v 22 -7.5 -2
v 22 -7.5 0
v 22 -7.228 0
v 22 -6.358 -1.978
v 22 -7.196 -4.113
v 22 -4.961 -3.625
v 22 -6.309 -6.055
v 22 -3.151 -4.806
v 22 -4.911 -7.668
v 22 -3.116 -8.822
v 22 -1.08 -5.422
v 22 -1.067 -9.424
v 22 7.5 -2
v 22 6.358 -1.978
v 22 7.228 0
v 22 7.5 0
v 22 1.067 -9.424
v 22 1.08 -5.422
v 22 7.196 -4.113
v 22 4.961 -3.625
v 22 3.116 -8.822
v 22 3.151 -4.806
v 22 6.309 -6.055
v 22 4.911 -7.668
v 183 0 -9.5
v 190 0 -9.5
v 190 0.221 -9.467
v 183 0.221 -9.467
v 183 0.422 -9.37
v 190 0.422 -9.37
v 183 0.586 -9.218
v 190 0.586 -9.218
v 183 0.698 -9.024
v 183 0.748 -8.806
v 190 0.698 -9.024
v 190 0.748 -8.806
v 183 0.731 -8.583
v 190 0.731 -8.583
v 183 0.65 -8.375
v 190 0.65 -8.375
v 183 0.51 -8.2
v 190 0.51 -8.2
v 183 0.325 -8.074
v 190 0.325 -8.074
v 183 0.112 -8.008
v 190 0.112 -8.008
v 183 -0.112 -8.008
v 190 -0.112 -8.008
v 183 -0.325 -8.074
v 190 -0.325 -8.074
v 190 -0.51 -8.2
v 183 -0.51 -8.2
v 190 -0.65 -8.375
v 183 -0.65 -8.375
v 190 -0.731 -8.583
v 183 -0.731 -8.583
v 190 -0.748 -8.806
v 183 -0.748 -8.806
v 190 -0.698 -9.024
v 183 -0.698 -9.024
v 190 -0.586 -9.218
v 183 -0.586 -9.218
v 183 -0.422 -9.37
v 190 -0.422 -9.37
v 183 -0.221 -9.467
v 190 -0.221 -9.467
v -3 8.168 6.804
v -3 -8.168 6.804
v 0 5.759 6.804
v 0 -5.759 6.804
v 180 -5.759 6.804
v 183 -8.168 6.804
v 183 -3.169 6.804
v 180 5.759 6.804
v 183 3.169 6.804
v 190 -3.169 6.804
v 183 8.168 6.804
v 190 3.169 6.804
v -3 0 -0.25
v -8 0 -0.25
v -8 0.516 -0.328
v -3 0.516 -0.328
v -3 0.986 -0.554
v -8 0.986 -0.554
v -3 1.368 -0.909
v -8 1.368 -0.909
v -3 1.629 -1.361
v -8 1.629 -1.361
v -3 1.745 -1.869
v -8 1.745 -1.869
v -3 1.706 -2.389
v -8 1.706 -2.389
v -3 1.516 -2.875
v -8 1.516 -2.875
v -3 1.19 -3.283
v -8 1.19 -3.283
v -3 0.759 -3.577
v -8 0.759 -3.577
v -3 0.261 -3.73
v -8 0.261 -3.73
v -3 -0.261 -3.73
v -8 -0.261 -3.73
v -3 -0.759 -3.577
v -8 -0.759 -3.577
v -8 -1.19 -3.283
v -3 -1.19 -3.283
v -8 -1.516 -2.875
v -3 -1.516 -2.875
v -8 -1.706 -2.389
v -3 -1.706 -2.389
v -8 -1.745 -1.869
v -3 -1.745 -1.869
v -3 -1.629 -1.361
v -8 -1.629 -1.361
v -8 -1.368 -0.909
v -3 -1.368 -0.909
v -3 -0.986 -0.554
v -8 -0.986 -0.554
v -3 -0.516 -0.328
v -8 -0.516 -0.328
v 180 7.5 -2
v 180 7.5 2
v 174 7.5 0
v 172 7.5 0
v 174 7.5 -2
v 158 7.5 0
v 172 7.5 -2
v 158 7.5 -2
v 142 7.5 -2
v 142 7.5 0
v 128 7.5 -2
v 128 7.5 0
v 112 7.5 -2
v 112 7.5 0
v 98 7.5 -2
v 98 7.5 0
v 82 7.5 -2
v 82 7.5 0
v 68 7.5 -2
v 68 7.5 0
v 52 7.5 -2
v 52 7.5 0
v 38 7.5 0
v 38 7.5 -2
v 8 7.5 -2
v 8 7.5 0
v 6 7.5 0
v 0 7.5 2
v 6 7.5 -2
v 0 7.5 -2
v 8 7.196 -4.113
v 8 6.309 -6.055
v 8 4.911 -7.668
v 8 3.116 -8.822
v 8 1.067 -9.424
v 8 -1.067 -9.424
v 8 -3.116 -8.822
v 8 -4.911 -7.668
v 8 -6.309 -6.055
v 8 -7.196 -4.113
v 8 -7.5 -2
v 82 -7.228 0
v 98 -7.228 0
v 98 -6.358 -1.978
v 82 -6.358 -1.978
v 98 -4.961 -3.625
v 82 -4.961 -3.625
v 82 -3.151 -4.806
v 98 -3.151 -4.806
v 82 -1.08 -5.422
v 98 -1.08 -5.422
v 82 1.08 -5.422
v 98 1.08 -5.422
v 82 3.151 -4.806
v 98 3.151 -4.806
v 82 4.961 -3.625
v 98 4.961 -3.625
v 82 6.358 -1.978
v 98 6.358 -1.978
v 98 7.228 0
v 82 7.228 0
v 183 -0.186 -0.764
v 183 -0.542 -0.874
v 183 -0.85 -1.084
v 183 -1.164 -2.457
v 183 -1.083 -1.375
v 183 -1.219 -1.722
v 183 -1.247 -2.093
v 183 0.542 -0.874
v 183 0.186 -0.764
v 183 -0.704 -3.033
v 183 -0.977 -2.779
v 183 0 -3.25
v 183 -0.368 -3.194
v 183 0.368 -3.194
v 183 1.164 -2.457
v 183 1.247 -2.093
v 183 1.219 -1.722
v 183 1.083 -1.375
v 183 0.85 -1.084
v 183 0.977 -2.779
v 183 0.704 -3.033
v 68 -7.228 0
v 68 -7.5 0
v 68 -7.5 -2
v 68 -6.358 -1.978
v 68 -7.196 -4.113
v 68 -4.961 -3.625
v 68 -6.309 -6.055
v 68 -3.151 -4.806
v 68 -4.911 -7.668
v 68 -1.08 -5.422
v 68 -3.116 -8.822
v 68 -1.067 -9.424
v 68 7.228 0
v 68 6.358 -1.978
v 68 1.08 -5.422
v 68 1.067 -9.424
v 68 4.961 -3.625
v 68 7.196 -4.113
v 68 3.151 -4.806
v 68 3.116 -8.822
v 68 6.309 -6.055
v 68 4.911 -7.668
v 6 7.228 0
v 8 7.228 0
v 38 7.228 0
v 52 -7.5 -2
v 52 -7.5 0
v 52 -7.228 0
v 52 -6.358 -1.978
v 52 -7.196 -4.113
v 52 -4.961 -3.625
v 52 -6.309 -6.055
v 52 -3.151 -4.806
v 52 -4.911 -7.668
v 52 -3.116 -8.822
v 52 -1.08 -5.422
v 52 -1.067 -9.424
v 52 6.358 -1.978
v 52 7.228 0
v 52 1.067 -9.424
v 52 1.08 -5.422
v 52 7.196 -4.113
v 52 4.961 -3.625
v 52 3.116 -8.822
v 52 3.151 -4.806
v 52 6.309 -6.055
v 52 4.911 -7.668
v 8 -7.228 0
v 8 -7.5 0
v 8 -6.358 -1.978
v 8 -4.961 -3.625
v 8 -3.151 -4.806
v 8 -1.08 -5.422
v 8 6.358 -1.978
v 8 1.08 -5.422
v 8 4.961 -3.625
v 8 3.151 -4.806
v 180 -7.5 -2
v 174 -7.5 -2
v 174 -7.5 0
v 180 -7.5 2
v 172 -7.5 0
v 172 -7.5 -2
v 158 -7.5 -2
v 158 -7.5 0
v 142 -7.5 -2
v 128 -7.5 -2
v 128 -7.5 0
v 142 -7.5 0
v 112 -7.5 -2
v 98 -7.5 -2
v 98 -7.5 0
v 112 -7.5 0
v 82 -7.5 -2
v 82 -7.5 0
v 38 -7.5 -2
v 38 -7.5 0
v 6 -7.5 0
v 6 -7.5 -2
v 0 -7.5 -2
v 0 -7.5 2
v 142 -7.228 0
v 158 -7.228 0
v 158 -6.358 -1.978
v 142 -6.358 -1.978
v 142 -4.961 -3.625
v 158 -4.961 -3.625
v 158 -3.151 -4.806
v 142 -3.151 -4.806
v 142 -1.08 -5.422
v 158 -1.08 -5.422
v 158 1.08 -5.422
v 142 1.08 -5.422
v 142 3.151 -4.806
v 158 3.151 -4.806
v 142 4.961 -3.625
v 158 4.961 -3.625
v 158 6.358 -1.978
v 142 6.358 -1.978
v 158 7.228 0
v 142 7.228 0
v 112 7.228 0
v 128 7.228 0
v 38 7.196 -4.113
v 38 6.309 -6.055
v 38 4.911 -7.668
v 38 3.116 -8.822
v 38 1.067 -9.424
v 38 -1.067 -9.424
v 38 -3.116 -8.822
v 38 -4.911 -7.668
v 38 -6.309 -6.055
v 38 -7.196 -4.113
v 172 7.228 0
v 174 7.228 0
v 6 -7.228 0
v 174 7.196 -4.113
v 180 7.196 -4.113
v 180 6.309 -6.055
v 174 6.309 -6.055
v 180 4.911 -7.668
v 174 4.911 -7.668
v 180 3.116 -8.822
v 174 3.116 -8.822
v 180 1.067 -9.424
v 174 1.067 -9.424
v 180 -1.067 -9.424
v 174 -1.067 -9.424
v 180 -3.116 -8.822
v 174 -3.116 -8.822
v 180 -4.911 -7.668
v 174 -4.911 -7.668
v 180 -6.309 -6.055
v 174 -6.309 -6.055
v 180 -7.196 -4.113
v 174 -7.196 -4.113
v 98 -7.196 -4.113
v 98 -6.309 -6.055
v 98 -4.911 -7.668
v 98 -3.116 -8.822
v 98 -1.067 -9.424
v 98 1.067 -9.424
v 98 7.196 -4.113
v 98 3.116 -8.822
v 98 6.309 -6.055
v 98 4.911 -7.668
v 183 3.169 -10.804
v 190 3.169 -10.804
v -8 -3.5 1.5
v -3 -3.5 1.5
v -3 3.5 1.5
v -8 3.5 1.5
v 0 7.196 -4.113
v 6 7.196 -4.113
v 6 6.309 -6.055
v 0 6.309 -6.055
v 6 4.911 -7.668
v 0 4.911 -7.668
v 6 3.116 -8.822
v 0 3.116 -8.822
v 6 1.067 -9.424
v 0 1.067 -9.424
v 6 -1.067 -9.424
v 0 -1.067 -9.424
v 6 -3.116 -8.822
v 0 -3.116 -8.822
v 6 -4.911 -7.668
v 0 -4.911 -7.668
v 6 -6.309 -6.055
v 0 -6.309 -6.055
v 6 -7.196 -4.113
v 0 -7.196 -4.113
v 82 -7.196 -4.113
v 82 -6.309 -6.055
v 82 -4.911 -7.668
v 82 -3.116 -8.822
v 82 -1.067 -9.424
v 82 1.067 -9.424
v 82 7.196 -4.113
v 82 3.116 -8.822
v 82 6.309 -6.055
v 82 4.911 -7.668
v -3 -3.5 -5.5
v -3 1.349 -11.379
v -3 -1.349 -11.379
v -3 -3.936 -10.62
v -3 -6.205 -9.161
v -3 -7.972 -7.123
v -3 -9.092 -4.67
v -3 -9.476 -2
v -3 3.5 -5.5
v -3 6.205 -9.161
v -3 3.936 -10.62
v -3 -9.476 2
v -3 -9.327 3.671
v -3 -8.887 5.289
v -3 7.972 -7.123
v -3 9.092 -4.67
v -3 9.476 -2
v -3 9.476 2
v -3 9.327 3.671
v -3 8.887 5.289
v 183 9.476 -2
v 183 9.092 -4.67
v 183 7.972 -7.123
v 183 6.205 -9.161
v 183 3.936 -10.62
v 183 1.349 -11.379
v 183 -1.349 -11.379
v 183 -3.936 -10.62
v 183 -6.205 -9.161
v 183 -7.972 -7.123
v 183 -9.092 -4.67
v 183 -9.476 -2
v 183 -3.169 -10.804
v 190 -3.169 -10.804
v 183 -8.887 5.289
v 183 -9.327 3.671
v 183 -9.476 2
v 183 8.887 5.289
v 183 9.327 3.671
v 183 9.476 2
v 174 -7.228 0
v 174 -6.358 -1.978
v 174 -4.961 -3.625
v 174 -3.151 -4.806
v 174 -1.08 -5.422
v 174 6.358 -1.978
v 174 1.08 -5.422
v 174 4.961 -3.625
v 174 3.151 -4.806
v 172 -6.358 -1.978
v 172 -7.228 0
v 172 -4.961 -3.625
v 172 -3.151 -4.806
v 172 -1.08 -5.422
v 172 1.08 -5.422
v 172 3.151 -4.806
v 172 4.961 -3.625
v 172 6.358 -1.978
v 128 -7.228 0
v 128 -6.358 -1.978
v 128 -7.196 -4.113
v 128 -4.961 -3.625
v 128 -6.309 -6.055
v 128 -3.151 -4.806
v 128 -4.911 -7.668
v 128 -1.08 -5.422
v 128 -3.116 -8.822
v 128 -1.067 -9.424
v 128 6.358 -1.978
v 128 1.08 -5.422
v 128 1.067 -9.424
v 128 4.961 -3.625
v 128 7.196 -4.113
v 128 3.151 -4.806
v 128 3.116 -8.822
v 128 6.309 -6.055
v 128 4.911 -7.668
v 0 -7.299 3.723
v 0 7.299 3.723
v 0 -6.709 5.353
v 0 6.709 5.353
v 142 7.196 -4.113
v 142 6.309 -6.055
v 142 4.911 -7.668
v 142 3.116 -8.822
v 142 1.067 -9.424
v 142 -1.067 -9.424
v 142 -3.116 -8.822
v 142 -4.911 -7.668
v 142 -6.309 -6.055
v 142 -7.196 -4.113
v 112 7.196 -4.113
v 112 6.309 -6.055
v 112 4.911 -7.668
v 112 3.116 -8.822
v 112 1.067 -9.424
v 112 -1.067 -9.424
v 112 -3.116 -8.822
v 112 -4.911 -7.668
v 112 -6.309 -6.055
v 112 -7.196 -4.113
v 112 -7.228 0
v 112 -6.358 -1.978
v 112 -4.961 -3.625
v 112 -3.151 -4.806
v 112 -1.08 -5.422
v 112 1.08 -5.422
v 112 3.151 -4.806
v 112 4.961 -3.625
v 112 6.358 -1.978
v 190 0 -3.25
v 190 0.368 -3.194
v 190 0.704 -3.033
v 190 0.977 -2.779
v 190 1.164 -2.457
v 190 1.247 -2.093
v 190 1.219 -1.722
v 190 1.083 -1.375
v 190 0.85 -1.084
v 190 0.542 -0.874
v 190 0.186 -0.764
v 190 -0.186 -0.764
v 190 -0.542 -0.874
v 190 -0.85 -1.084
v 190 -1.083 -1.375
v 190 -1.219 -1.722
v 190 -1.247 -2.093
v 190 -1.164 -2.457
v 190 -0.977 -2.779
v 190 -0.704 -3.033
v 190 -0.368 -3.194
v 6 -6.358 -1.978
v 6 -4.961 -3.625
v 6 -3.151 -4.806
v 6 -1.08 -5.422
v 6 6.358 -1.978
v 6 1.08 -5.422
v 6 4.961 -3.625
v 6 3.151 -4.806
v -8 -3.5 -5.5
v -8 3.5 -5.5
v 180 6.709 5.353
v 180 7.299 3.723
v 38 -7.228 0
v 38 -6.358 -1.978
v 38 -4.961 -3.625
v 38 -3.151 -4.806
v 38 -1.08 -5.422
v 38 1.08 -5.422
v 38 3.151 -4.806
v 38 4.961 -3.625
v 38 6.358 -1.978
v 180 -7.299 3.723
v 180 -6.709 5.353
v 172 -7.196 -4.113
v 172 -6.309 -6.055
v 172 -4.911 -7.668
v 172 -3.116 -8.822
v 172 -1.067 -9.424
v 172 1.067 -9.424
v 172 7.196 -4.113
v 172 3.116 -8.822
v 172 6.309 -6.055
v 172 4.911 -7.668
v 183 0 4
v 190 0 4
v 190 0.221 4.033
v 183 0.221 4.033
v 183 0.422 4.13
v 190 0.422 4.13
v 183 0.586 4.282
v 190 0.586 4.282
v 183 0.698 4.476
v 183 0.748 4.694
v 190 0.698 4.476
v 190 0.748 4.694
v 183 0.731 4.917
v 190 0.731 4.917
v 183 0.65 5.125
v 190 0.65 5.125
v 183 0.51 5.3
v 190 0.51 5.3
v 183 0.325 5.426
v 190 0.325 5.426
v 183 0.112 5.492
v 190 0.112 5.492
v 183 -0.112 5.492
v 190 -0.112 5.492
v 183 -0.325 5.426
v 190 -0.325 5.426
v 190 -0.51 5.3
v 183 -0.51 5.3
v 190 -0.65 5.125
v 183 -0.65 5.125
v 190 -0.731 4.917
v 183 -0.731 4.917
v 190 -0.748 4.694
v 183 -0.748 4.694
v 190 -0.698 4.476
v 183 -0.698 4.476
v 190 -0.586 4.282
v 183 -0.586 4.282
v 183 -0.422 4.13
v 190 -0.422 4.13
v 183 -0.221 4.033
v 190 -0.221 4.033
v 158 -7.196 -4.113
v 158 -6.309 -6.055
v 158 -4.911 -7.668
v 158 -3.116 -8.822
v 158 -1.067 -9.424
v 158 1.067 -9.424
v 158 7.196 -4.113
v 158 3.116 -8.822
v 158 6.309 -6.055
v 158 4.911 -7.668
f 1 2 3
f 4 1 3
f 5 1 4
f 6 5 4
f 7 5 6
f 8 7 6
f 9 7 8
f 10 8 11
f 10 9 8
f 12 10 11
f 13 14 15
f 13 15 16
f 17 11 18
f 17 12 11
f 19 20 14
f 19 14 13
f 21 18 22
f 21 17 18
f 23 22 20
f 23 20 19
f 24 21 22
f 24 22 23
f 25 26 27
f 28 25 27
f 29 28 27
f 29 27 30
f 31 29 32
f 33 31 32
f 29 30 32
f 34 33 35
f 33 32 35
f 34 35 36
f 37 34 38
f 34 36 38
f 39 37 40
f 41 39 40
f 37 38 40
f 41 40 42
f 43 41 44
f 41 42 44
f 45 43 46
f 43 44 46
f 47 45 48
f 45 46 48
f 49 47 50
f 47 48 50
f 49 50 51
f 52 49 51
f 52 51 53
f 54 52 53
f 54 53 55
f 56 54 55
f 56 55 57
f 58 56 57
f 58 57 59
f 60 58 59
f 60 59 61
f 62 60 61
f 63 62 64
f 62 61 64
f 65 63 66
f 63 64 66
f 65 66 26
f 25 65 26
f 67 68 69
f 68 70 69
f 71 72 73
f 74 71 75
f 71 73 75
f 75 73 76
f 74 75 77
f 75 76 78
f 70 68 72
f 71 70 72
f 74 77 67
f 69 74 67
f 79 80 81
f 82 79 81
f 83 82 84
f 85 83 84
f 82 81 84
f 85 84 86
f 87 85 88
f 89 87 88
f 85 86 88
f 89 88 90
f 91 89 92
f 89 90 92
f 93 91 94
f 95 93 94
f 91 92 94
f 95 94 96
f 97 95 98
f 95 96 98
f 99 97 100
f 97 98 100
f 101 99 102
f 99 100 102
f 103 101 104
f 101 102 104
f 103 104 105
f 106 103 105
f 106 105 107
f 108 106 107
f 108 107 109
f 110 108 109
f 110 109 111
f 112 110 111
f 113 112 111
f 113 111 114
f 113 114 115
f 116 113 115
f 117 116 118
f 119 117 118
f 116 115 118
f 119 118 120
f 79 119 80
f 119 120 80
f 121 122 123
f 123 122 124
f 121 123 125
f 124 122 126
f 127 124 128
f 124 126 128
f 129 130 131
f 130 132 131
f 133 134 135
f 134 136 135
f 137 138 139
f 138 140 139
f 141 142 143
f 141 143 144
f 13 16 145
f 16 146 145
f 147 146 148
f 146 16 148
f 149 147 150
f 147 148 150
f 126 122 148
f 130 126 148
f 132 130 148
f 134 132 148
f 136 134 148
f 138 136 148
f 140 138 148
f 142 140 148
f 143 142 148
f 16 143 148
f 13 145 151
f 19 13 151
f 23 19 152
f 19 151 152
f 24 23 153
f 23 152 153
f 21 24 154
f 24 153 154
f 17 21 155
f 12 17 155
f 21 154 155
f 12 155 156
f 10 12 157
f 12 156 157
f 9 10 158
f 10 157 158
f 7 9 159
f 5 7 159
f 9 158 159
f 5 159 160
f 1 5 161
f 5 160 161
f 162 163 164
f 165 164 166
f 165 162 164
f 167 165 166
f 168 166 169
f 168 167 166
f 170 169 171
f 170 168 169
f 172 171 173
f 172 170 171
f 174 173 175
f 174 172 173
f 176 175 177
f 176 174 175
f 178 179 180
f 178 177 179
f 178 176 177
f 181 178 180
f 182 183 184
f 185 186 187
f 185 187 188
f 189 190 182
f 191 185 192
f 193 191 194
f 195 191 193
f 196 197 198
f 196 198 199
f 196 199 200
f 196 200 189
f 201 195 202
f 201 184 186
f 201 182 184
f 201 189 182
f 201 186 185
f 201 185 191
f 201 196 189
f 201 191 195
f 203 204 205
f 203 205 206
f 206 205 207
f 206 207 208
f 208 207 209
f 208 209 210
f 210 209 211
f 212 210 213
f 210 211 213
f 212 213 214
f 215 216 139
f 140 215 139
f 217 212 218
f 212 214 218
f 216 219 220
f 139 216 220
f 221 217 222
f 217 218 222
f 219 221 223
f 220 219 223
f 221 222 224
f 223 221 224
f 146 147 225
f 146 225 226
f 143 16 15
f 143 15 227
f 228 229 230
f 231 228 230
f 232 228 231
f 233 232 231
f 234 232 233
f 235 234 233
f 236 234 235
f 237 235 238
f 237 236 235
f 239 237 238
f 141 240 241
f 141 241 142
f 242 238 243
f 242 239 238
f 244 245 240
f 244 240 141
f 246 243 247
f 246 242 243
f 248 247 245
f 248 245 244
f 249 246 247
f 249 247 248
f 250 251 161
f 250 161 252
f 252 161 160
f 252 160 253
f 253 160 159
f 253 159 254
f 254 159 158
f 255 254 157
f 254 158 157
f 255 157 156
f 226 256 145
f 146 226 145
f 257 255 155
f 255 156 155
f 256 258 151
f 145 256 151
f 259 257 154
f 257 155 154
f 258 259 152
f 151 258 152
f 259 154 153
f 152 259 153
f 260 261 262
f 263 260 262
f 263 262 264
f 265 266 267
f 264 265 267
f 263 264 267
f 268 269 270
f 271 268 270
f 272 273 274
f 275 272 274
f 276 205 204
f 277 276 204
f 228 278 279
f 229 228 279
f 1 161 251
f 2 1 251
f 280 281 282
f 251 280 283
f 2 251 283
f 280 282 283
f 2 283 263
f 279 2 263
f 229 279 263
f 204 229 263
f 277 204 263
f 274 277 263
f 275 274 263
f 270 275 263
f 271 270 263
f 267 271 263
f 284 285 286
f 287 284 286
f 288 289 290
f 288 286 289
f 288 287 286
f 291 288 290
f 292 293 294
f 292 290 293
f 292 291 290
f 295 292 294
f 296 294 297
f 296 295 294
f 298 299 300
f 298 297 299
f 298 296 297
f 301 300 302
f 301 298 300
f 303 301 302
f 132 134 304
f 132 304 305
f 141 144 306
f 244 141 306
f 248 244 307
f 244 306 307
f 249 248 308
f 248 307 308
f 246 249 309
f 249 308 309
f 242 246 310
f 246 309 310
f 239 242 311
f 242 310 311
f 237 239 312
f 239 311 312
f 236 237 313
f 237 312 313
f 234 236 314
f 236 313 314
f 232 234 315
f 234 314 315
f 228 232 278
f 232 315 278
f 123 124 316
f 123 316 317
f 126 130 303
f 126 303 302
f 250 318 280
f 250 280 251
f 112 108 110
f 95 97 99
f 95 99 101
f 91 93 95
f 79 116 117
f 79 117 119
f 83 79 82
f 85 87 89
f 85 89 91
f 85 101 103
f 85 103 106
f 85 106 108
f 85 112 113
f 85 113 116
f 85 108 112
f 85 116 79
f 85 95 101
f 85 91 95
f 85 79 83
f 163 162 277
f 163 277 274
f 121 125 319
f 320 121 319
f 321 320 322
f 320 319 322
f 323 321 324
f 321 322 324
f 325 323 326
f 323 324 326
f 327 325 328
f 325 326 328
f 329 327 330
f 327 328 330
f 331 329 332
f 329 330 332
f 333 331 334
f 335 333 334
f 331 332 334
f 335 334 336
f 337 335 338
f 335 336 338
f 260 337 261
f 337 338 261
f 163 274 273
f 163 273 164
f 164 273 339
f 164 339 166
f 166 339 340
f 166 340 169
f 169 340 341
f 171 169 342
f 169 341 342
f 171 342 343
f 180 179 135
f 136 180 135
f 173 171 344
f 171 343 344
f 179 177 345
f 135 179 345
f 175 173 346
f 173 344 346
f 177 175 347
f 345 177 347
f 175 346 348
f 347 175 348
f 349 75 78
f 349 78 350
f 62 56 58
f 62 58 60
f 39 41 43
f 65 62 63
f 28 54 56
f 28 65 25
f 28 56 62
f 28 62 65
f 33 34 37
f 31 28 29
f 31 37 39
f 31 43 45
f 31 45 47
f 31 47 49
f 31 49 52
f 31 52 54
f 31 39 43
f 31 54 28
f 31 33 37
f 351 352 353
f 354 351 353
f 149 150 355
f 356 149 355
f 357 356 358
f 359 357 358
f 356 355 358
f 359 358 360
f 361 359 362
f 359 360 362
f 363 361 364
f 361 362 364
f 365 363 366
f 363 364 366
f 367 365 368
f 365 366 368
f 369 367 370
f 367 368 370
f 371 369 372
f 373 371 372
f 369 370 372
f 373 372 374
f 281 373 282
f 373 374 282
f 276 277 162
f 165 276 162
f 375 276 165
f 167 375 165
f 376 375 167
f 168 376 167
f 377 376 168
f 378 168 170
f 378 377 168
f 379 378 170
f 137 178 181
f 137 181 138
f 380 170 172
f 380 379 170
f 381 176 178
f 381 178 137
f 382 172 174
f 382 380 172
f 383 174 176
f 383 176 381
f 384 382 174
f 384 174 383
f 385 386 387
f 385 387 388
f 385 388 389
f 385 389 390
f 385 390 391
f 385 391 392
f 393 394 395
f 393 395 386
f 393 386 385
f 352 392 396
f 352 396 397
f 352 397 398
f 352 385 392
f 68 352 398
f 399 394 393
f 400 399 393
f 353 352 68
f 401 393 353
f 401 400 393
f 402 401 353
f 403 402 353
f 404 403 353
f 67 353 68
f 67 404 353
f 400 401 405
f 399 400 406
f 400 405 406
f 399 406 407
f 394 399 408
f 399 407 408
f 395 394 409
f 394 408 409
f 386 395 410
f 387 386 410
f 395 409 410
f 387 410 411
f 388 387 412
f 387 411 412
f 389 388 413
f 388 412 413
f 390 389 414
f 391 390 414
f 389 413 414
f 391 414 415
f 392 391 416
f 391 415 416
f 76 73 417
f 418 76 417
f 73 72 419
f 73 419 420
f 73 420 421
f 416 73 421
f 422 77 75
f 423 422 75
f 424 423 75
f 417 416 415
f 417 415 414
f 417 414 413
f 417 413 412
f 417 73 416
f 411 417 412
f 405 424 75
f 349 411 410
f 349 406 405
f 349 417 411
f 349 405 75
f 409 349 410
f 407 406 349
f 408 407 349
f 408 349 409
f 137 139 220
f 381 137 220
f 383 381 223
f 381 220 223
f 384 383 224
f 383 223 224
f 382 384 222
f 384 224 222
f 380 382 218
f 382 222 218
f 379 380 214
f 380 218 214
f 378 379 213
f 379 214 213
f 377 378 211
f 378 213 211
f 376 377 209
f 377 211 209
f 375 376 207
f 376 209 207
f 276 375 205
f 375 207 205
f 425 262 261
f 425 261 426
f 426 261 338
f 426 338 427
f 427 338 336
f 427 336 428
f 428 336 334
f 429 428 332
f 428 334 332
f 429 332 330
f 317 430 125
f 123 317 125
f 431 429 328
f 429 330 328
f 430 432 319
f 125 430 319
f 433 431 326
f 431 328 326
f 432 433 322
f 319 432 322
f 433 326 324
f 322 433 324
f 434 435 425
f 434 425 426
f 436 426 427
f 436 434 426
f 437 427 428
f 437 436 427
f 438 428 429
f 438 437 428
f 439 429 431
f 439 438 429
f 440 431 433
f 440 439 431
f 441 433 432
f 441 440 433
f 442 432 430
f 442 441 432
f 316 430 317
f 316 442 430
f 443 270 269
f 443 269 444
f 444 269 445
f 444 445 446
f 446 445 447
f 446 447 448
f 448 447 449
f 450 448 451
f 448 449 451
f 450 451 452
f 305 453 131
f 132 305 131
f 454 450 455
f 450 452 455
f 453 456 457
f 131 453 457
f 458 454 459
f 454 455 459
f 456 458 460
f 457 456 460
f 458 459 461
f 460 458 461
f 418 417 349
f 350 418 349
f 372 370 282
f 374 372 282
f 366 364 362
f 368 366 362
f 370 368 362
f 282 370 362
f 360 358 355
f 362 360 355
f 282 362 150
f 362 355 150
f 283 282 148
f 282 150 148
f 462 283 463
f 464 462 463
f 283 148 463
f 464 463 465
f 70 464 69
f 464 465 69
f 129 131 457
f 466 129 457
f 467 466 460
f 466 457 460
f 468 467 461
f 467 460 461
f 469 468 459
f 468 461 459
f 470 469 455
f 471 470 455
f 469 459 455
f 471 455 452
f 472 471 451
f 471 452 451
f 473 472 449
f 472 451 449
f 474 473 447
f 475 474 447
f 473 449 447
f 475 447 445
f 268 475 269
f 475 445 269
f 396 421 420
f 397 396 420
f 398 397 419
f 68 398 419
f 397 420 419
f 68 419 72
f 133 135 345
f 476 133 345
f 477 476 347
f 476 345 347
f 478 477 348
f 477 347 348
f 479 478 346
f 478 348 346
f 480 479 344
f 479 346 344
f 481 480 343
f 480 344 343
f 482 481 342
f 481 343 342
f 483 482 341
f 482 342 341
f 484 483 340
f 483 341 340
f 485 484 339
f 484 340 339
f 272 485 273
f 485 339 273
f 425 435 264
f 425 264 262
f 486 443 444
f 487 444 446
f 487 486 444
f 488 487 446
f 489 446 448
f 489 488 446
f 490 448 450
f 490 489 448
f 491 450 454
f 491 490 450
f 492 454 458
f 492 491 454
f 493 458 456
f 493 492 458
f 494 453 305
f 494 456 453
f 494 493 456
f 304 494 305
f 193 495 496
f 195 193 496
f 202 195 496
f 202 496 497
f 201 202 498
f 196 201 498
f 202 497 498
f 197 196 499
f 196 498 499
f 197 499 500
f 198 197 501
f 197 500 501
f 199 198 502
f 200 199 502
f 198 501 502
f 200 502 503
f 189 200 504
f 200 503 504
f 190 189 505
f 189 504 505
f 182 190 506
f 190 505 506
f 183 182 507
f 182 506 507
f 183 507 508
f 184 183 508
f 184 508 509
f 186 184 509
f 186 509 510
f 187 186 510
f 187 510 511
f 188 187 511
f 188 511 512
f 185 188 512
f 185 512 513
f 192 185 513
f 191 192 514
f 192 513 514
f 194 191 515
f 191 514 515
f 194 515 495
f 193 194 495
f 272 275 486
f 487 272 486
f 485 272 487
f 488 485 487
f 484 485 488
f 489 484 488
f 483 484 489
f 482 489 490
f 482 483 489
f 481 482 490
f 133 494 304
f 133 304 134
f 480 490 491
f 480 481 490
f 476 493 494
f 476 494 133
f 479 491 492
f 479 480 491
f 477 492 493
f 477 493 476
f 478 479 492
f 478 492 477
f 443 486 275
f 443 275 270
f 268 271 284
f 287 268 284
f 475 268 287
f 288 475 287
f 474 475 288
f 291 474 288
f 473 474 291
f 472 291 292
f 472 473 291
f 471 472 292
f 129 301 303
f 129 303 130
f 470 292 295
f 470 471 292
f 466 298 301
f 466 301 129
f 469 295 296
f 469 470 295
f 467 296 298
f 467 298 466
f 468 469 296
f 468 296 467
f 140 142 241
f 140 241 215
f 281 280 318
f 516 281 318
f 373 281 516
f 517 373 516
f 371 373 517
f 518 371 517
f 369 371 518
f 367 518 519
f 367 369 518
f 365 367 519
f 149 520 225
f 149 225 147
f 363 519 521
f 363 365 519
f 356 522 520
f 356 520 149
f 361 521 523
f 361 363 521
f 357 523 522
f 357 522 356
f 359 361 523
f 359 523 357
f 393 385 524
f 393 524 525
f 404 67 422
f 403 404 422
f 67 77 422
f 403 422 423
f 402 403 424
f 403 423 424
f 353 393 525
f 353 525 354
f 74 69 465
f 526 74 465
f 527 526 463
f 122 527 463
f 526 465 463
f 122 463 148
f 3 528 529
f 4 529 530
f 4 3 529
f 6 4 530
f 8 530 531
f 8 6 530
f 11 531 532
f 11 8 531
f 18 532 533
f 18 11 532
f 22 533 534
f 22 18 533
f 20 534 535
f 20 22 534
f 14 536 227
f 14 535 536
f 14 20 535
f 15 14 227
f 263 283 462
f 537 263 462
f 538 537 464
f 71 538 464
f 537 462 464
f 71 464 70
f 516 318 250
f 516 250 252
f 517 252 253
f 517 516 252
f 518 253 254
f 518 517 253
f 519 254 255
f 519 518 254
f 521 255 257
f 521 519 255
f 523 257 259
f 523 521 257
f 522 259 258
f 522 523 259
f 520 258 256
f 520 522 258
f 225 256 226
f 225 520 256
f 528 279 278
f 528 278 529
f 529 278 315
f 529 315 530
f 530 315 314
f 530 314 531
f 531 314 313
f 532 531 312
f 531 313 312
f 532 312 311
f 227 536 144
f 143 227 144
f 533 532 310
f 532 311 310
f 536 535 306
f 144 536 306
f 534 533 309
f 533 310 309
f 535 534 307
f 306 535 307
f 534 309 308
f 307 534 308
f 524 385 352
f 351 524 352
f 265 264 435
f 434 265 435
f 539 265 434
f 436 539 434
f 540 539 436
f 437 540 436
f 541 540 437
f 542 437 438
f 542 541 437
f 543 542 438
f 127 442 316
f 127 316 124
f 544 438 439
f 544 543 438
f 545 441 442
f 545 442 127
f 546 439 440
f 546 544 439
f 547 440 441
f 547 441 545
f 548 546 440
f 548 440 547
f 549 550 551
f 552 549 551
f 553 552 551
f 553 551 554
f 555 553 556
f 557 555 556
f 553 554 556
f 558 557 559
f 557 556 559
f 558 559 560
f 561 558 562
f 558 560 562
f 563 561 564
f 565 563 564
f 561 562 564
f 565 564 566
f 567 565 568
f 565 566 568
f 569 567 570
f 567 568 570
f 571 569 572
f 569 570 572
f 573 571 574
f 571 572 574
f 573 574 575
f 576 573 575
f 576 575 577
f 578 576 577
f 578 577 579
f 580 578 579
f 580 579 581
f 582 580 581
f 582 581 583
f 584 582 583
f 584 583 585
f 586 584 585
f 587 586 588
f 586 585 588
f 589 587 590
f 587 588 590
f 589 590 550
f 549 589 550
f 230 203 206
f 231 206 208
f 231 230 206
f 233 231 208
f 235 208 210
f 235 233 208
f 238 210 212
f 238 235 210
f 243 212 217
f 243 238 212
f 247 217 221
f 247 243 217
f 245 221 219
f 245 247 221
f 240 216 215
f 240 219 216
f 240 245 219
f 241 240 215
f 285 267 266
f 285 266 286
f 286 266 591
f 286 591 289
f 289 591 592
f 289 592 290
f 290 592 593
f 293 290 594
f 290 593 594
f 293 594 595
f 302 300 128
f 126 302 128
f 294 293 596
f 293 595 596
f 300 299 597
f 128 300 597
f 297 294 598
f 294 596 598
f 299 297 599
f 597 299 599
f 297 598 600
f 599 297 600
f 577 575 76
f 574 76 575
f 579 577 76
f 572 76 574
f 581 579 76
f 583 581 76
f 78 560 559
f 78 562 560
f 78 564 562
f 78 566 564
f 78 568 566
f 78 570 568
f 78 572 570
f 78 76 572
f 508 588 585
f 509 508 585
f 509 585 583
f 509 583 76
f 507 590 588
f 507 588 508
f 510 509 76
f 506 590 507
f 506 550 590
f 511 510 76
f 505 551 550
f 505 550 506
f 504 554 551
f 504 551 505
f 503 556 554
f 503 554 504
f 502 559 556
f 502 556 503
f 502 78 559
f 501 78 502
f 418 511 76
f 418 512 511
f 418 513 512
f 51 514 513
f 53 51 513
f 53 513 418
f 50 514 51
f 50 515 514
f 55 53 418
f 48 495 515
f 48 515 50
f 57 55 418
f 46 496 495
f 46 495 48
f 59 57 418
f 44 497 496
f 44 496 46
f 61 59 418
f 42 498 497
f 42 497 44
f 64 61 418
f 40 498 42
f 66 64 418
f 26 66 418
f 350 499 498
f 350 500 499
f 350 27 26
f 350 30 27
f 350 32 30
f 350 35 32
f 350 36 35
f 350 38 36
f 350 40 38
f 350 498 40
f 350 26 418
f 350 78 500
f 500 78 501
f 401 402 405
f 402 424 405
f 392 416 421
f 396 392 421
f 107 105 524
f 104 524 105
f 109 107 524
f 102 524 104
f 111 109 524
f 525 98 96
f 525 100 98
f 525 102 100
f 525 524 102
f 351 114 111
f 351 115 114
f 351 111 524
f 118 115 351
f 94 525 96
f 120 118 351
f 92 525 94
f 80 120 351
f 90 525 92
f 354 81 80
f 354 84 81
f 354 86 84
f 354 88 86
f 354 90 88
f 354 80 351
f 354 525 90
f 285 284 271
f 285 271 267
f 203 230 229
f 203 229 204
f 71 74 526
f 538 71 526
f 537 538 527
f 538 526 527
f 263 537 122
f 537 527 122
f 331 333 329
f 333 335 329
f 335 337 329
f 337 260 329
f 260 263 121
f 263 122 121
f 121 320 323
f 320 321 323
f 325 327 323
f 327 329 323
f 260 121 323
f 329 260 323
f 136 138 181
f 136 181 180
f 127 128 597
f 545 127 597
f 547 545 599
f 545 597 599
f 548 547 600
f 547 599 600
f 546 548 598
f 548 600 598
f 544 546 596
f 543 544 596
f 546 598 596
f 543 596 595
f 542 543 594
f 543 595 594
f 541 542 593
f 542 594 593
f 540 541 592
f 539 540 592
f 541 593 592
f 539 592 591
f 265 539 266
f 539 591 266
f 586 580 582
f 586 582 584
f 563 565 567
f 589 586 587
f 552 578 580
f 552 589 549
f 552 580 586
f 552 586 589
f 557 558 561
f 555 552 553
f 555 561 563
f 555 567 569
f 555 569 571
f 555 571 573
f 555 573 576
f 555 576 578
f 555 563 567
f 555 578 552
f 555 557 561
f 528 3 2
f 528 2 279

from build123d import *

# Parameters (mm, degrees)
AUFSATZ_LINEAR_AUSTRAGEN1_DEPTH = 180
AUFSATZ_LINEAR_START            = -10
SKIZZE3_W                       = 2
SKIZZE3_H                       = 15
AUFSATZ_LINEAR_AUSTRAGEN2_DEPTH = 10
SKIZZE11_W                      = 12
SKIZZE11_H                      = 15
AUFSATZ_LINEAR_AUSTRAGEN6_DEPTH = 10
SCHNITT_LINEAR_AUSTRAGEN3_DEPTH = 200
AUFSATZ_LINEAR_AUSTRAGEN3_DEPTH = 3
SKIZZE9_W                       = 17.608625436
SKIZZE9_H                       = 6.338284118
AUFSATZ_LINEAR_AUSTRAGEN5_DEPTH = 7
SKIZZE10_R                      = 0.75
SKIZZE10_R_2                    = 1.25
SCHNITT_LINEAR_AUSTRAGEN5_DEPTH = 7
AUFSATZ_LINEAR_START_2          = 3
AUFSATZ_LINEAR_AUSTRAGEN7_DEPTH = 3
SKIZZE13_W                      = 7
SKIZZE13_H                      = 7
AUFSATZ_LINEAR_AUSTRAGEN8_DEPTH = 5
SKIZZE15_R                      = 1.75
SCHNITT_LINEAR_AUSTRAGEN6_DEPTH = 5


with BuildPart() as part:
    # Skizze2 → Aufsatz-Linear austragen1 (new body)
    with BuildSketch(Plane(origin=(0, 0, 0), x_dir=(0, 0, -1), z_dir=(1, 0, 0))):
        with BuildLine():
            ThreePointArc((-6.804312718, 5.759216901), (-4.554982705, 7.051387337), (-2, 7.5))
            Line((-2, 7.5), (2, 7.5))
            ThreePointArc((2, 7.5), (9.5, 0), (2, -7.5))
            Line((2, -7.5), (-2, -7.5))
            ThreePointArc((-2, -7.5), (-4.554982705, -7.051387337), (-6.804312718, -5.759216901))
            Line((-6.804312718, -5.759216901), (-6.804312718, -8.195643923))
            ThreePointArc((-6.804312718, -8.195643923), (-4.489114575, -9.16811369), (-2, -9.5))
            Line((-2, -9.5), (2, -9.5))
            ThreePointArc((2, -9.5), (11.5, 0), (2, 9.5))
            Line((2, 9.5), (-2, 9.5))
            ThreePointArc((-2, 9.5), (-4.489114575, 9.16811369), (-6.804312718, 8.195643923))
            Line((-6.804312718, 8.195643923), (-6.804312718, 5.759216901))
        make_face()
    extrude(amount=AUFSATZ_LINEAR_AUSTRAGEN1_DEPTH)

    # Skizze3 → Aufsatz-Linear austragen2 (add)
    with BuildSketch(Plane.XY.offset(AUFSATZ_LINEAR_START)):
        with Locations((37, 0)):
            Rectangle(SKIZZE3_W, SKIZZE3_H)
        with Locations((7, 0)):
            Rectangle(SKIZZE3_W, SKIZZE3_H)
        with Locations((23, 0)):
            Rectangle(SKIZZE3_W, SKIZZE3_H)
        with Locations((53, 0)):
            Rectangle(SKIZZE3_W, SKIZZE3_H)
        with Locations((67, 0)):
            Rectangle(SKIZZE3_W, SKIZZE3_H)
        with Locations((83, 0)):
            Rectangle(SKIZZE3_W, SKIZZE3_H)
        with Locations((97, 0)):
            Rectangle(SKIZZE3_W, SKIZZE3_H)
        with Locations((113, 0)):
            Rectangle(SKIZZE3_W, SKIZZE3_H)
        with Locations((127, 0)):
            Rectangle(SKIZZE3_W, SKIZZE3_H)
        with Locations((143, 0)):
            Rectangle(SKIZZE3_W, SKIZZE3_H)
        with Locations((157, 0)):
            Rectangle(SKIZZE3_W, SKIZZE3_H)
        with Locations((173, 0)):
            Rectangle(SKIZZE3_W, SKIZZE3_H)
    extrude(amount=AUFSATZ_LINEAR_AUSTRAGEN2_DEPTH)

    # Skizze11 → Aufsatz-Linear austragen6 (add)
    with BuildSketch(Plane.XY.offset(AUFSATZ_LINEAR_START)):
        with Locations((30, 0)):
            Rectangle(SKIZZE11_W, SKIZZE11_H)
        with Locations((60, 0)):
            Rectangle(SKIZZE11_W, SKIZZE11_H)
        with Locations((90, 0)):
            Rectangle(SKIZZE11_W, SKIZZE11_H)
        with Locations((120, 0)):
            Rectangle(SKIZZE11_W, SKIZZE11_H)
        with Locations((150, 0)):
            Rectangle(SKIZZE11_W, SKIZZE11_H)
    extrude(amount=AUFSATZ_LINEAR_AUSTRAGEN6_DEPTH)

    # Skizze5 → Schnitt-Linear austragen3 (cut)
    with BuildSketch(Plane(origin=(0, 0, 0), x_dir=(0, 0, -1), z_dir=(1, 0, 0))):
        with BuildLine():
            ThreePointArc((0, -7.228416147), (5.5, 0), (0, 7.228416147))
            Line((0, 7.228416147), (0, -7.228416147))
        make_face()
        with BuildLine():
            ThreePointArc((2, 9.47585653), (11.47585653, 0), (2, -9.47585653))
            Line((2, -9.47585653), (-2, -9.47585653))
            ThreePointArc((-2, -9.47585653), (-5.40264982, -8.843858388), (-8.35141595, -7.032166979))
            ThreePointArc((-8.35141595, -7.032166979), (14.514119409, 0), (-8.35141595, 7.032166979))
            ThreePointArc((-8.35141595, 7.032166979), (-5.40264982, 8.843858388), (-2, 9.47585653))
            Line((-2, 9.47585653), (2, 9.47585653))
        make_face()
    extrude(amount=SCHNITT_LINEAR_AUSTRAGEN3_DEPTH, mode=Mode.SUBTRACT)

    # Skizze6 → Aufsatz-Linear austragen3 (add)
    with BuildSketch(Plane(origin=(180, 0, 0), x_dir=(0, 0, -1), z_dir=(1, 0, 0))):
        with BuildLine():
            ThreePointArc((-2, 9.47585653), (-4.489620265, 9.142956192), (-6.804312718, 8.167645701))
            Line((-6.804312718, 8.167645701), (-6.804312718, -8.167645701))
            ThreePointArc((-6.804312718, -8.167645701), (-4.489620265, -9.142956192), (-2, -9.47585653))
            Line((-2, -9.47585653), (2, -9.47585653))
            ThreePointArc((2, -9.47585653), (11.47585653, 0), (2, 9.47585653))
            Line((2, 9.47585653), (-2, 9.47585653))
        make_face()
    extrude(amount=AUFSATZ_LINEAR_AUSTRAGEN3_DEPTH)

    # Skizze9 → Aufsatz-Linear austragen5 (add)
    with BuildSketch(Plane(origin=(183, 0, 0), x_dir=(0, 0, -1), z_dir=(1, 0, 0))):
        with Locations((2, 0)):
            Rectangle(SKIZZE9_W, SKIZZE9_H)
    extrude(amount=AUFSATZ_LINEAR_AUSTRAGEN5_DEPTH)

    # Skizze10 → Schnitt-Linear austragen5 (cut)
    with BuildSketch(Plane(origin=(190, 0, 0), x_dir=(0, 0, -1), z_dir=(1, 0, 0))):
        with Locations((-4.75, 0)):
            Circle(SKIZZE10_R)
        with Locations((8.75, 0)):
            Circle(SKIZZE10_R)
        with Locations((2, 0)):
            Circle(SKIZZE10_R_2)
    extrude(amount=-SCHNITT_LINEAR_AUSTRAGEN5_DEPTH, mode=Mode.SUBTRACT)

    # Skizze12 → Aufsatz-Linear austragen7 (add)
    with BuildSketch(Plane.ZY.offset(AUFSATZ_LINEAR_START_2)):
        with BuildLine():
            ThreePointArc((6.804312718, 8.167645701), (4.489620265, 9.142956192), (2, 9.47585653))
            Line((2, 9.47585653), (-2, 9.47585653))
            ThreePointArc((-2, 9.47585653), (-11.47585653, 0), (-2, -9.47585653))
            Line((-2, -9.47585653), (2, -9.47585653))
            ThreePointArc((2, -9.47585653), (4.489620265, -9.142956192), (6.804312718, -8.167645701))
            Line((6.804312718, -8.167645701), (6.804312718, 8.167645701))
        make_face()
    extrude(amount=-AUFSATZ_LINEAR_AUSTRAGEN7_DEPTH)

    # Skizze13 → Aufsatz-Linear austragen8 (add)
    with BuildSketch(Plane.ZY.offset(3)):
        with Locations((-2, 0)):
            Rectangle(SKIZZE13_W, SKIZZE13_H)
    extrude(amount=AUFSATZ_LINEAR_AUSTRAGEN8_DEPTH)

    # Skizze15 → Schnitt-Linear austragen6 (cut)
    with BuildSketch(Plane.ZY.offset(8)):
        with Locations((-2, 0)):
            Circle(SKIZZE15_R)
    extrude(amount=-SCHNITT_LINEAR_AUSTRAGEN6_DEPTH, mode=Mode.SUBTRACT)


solid = part.part
